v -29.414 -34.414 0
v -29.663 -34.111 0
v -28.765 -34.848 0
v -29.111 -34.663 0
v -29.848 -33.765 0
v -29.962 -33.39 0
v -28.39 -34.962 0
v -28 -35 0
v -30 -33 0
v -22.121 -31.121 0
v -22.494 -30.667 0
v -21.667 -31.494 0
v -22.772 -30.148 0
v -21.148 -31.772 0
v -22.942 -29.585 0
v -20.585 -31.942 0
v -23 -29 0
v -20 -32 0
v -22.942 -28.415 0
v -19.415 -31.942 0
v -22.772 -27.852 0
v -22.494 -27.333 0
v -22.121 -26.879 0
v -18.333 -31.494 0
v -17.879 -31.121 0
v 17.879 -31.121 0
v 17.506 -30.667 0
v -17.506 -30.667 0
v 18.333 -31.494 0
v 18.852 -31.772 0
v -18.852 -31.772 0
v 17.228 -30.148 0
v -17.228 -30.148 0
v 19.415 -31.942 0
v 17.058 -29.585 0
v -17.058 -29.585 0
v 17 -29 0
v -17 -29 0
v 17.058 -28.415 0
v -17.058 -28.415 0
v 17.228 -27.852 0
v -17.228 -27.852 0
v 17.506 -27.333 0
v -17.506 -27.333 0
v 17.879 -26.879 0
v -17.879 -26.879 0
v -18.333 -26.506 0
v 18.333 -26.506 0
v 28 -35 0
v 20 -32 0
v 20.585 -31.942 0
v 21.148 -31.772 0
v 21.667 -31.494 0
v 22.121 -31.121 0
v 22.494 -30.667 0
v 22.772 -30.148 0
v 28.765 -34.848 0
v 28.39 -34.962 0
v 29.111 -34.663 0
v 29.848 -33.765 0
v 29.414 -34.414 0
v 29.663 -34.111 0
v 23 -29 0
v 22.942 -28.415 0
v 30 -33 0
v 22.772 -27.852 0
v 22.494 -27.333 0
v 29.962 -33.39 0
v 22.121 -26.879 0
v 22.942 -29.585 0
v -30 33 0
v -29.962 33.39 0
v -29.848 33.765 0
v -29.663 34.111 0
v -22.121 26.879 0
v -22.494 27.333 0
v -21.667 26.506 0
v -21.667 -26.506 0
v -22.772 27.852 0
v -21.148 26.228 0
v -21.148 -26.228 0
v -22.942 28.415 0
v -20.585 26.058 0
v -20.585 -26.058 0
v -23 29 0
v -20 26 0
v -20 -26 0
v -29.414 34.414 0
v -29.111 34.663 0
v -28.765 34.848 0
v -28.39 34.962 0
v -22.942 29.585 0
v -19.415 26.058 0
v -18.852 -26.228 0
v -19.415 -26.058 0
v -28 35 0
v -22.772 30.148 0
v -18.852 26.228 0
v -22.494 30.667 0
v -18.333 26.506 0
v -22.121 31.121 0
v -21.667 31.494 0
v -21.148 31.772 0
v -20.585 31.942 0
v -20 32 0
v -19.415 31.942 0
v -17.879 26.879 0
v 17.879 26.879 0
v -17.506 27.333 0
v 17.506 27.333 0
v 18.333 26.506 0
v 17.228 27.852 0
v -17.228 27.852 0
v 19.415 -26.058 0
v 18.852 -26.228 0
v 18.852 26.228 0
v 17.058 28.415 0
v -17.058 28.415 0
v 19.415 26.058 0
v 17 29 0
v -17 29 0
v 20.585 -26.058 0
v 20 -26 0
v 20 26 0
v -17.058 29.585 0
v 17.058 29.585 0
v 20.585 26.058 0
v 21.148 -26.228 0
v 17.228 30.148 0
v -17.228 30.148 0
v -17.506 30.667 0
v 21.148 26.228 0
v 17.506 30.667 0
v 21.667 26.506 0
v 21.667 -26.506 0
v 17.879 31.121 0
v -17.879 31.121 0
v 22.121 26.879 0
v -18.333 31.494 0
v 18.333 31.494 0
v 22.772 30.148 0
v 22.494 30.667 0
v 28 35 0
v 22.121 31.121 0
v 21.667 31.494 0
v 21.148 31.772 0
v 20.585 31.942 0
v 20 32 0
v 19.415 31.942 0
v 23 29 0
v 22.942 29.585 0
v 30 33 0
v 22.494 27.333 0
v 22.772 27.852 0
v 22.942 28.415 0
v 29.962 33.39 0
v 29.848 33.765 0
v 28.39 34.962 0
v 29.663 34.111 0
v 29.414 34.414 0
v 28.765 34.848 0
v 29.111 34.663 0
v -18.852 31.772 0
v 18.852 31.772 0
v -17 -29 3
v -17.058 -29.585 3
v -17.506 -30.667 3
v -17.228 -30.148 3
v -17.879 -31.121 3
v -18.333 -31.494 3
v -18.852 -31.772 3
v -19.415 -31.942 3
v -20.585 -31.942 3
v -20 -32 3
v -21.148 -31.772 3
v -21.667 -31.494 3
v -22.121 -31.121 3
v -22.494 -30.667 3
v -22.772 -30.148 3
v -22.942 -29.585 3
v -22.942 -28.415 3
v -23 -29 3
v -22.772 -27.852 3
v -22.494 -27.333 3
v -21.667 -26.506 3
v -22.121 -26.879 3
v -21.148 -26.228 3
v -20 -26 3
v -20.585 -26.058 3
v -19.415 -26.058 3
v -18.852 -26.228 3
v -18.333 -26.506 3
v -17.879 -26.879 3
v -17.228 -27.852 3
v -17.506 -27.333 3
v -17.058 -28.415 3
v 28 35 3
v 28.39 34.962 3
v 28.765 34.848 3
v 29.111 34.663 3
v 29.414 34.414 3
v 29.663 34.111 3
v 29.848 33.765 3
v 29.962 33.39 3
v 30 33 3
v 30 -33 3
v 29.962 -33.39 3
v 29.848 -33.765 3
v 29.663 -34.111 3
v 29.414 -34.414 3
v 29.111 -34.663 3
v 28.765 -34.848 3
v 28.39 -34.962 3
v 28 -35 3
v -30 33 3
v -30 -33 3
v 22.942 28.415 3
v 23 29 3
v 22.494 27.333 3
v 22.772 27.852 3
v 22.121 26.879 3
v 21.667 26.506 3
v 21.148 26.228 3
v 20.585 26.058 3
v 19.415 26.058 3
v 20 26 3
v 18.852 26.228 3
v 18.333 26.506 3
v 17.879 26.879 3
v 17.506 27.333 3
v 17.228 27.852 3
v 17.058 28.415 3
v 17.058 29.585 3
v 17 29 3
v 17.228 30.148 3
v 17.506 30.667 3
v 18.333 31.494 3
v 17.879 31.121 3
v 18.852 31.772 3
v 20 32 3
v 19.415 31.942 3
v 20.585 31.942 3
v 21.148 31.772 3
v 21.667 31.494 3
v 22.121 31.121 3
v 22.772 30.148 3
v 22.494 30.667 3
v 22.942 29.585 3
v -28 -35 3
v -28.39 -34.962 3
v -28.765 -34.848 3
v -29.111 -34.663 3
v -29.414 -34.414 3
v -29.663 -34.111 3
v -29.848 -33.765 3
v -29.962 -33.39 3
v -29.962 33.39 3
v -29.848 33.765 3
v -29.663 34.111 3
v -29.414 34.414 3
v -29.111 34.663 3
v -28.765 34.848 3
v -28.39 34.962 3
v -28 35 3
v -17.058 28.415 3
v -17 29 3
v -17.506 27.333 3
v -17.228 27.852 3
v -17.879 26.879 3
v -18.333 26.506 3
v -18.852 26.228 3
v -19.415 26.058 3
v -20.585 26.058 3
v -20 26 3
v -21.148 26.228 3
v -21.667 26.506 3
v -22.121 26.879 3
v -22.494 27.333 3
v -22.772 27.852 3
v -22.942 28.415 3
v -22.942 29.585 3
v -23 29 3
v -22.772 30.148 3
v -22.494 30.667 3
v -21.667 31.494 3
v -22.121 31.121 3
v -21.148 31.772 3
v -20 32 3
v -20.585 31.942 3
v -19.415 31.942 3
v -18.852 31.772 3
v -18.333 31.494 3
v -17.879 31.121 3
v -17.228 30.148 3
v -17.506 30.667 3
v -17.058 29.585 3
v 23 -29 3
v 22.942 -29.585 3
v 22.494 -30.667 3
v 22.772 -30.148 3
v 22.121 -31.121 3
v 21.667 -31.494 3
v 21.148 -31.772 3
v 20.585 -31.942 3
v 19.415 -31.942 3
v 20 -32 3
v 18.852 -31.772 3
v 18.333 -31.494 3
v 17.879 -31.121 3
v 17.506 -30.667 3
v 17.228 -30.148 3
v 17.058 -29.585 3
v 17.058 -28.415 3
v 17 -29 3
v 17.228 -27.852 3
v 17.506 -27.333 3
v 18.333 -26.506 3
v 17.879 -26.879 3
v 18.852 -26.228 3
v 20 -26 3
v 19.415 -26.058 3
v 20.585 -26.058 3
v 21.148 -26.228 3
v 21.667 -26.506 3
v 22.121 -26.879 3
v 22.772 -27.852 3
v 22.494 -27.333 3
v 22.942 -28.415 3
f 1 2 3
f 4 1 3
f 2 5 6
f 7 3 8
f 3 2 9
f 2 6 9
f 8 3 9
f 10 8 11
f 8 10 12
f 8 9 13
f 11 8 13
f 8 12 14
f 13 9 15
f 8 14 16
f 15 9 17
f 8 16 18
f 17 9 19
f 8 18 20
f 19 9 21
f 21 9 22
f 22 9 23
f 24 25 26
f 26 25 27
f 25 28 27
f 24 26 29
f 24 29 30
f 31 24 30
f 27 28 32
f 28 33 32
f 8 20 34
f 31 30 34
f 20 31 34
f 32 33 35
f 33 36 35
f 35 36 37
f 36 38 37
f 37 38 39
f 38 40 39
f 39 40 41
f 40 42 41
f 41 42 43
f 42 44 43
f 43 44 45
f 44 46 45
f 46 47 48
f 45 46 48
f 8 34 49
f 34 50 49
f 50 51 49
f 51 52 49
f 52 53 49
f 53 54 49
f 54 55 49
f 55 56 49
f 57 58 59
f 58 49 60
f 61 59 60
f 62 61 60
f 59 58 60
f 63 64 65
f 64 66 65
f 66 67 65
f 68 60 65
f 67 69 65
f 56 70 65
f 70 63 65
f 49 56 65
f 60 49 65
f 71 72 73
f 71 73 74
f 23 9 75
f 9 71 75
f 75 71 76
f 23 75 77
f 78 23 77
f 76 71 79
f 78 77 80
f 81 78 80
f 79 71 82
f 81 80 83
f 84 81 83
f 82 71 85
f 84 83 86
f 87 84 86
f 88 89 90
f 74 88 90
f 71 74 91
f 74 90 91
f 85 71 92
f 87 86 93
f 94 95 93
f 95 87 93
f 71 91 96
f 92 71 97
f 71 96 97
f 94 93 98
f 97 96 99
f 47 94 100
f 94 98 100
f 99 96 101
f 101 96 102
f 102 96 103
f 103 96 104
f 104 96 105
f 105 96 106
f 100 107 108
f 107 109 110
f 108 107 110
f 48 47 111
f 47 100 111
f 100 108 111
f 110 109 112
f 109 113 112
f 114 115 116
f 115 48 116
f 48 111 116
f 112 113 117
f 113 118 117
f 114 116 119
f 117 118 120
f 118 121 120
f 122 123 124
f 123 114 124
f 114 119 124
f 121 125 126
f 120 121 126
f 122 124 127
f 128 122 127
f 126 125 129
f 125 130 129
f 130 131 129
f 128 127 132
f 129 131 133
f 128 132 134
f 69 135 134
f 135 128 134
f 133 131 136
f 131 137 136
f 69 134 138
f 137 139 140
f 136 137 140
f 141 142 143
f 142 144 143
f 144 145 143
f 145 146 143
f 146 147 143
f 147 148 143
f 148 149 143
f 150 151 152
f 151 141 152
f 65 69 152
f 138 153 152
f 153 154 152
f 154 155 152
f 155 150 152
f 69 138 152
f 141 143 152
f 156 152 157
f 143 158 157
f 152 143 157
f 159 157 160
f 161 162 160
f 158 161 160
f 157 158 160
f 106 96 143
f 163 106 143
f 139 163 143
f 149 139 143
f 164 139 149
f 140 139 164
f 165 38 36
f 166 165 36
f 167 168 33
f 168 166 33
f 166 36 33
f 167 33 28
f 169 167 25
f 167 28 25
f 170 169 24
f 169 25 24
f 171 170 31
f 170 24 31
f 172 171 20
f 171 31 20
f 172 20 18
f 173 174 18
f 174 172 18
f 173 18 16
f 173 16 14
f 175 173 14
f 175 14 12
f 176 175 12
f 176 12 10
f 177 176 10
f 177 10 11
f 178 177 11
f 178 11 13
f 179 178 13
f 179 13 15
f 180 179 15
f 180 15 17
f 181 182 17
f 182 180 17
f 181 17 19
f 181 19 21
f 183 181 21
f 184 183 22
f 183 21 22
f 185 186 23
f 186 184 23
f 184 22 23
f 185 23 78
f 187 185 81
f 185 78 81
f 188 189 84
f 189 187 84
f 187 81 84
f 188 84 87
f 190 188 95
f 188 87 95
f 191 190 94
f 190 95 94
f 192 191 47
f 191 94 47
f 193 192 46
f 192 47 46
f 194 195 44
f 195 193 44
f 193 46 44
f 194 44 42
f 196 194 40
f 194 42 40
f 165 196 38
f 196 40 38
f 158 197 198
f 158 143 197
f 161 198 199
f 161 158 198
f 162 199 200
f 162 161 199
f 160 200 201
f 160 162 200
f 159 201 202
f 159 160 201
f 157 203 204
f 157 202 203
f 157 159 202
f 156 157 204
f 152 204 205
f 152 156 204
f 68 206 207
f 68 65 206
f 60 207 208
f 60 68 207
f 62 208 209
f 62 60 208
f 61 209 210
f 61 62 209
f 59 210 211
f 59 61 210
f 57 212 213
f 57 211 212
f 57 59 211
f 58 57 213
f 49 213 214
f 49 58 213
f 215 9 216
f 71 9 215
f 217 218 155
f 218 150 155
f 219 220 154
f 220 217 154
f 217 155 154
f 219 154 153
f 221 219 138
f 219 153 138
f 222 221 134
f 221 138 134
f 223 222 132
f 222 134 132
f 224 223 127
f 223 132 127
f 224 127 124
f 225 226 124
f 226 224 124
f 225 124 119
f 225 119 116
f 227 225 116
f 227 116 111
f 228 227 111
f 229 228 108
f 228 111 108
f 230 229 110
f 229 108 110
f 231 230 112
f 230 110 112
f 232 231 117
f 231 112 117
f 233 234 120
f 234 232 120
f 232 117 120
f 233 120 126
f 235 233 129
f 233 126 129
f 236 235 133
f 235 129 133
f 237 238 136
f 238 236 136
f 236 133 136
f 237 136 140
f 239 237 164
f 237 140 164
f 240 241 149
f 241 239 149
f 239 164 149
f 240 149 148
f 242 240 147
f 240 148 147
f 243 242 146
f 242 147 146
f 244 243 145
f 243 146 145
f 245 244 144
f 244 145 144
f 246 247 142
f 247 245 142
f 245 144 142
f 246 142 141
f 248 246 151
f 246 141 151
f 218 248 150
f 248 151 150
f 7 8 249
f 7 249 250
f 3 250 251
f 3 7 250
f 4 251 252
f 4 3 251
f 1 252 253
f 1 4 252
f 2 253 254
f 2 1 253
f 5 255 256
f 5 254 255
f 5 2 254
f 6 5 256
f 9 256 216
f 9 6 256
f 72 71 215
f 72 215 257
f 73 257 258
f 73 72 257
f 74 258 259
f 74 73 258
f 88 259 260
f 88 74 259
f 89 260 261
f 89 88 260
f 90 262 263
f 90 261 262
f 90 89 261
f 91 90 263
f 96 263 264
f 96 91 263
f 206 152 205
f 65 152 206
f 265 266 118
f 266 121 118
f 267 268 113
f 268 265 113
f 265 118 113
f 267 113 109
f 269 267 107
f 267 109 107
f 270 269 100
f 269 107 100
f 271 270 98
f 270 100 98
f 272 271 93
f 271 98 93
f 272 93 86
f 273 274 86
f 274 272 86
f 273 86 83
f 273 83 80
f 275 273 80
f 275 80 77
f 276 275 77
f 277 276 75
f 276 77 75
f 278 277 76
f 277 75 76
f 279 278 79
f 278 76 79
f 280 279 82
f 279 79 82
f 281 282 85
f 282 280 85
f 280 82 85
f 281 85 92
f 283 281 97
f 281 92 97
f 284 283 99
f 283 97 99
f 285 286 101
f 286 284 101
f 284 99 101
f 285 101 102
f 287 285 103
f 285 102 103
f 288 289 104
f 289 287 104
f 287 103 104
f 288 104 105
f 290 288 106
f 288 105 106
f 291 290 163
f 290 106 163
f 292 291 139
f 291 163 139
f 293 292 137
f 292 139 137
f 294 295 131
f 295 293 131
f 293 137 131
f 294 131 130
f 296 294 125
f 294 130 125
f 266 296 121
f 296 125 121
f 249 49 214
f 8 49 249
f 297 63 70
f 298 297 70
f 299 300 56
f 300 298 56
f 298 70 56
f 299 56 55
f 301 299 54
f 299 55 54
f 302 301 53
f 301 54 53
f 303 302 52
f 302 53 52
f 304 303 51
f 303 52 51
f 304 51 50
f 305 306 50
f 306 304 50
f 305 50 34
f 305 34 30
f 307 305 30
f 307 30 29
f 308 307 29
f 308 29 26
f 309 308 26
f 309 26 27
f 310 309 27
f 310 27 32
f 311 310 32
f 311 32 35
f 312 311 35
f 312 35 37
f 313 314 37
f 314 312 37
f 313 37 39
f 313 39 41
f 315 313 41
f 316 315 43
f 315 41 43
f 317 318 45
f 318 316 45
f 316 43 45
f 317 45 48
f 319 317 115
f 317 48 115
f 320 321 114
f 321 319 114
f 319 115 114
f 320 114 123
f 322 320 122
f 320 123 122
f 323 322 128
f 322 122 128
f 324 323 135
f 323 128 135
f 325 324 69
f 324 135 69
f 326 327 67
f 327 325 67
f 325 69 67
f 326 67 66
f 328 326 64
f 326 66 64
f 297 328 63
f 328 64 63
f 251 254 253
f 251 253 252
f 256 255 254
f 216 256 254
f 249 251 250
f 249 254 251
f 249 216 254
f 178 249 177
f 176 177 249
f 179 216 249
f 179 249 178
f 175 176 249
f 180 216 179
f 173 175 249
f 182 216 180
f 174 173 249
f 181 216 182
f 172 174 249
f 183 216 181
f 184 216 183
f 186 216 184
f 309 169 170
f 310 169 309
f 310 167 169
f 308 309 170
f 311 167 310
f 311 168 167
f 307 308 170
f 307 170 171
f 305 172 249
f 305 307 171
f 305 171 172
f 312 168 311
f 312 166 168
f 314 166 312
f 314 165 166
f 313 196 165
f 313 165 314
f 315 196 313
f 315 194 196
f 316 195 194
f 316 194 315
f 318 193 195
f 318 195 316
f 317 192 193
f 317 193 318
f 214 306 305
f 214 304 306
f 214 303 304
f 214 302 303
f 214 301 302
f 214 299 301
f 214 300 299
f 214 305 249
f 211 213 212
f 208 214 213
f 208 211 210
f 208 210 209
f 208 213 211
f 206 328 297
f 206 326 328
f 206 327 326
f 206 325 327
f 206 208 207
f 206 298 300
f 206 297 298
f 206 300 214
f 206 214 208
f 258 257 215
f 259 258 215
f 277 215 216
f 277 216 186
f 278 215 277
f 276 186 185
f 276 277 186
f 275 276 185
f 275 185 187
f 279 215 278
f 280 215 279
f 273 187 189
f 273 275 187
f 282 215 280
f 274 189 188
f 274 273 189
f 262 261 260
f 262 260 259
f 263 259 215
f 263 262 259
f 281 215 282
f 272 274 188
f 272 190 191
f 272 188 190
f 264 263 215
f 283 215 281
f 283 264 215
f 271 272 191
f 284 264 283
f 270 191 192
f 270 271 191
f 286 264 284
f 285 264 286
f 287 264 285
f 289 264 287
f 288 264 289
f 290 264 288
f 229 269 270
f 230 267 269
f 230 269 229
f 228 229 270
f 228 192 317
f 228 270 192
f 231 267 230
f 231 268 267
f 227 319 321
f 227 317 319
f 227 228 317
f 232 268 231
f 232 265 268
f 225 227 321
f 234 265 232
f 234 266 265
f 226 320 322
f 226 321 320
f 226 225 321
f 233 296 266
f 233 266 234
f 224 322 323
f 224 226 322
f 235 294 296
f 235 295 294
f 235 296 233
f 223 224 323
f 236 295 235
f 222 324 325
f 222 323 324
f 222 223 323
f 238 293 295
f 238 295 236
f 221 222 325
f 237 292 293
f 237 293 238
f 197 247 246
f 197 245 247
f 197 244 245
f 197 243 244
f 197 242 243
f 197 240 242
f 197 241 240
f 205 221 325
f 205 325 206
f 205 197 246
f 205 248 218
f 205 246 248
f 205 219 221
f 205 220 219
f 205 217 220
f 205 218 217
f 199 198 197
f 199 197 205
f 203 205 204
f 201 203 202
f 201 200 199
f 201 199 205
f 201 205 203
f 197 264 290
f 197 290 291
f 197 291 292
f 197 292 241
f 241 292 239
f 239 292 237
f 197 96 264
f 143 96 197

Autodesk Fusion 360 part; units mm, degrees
sketch "Sketch1" plane through (0, 0, 0) normal (0, 0, 1) x (1, 0, 0)
  line L0 (28, -35) -> (-28, -35)
  line L1 (-30, -33) -> (-30, 33)
  line L2 (-28, 35) -> (28, 35)
  line L3 (30, 33) -> (30, -33)
  line L4 (30, -35) -> (-30, 35) construction
  line L5 (-30, -35) -> (30, 35) construction
  arc A0 (-28, 35) -> (-30, 33) centre (-28, 33) ccw
  arc A1 (30, 33) -> (28, 35) centre (28, 33) ccw
  arc A2 (28, -35) -> (30, -33) centre (28, -33) ccw
  arc A3 (-30, -33) -> (-28, -35) centre (-28, -33) ccw
  circle A4 centre (-20, -29) radius 3
  line L6 (0, 0) -> (0, -32) construction
  line L7 (0, 0) -> (-27.3192, 0) construction
  circle A5 centre (20, -29) radius 3
  circle A6 centre (-20, 29) radius 3
  circle A7 centre (20, 29) radius 3
  dimension "d1" = 60
  dimension "d2" = 70
  dimension "d3" = 2
  dimension "d4" = 6
  dimension "d5" = 10
  dimension "d6" = 6
extrude "Extrude1" add sketch "Sketch1" along normal blind 3
